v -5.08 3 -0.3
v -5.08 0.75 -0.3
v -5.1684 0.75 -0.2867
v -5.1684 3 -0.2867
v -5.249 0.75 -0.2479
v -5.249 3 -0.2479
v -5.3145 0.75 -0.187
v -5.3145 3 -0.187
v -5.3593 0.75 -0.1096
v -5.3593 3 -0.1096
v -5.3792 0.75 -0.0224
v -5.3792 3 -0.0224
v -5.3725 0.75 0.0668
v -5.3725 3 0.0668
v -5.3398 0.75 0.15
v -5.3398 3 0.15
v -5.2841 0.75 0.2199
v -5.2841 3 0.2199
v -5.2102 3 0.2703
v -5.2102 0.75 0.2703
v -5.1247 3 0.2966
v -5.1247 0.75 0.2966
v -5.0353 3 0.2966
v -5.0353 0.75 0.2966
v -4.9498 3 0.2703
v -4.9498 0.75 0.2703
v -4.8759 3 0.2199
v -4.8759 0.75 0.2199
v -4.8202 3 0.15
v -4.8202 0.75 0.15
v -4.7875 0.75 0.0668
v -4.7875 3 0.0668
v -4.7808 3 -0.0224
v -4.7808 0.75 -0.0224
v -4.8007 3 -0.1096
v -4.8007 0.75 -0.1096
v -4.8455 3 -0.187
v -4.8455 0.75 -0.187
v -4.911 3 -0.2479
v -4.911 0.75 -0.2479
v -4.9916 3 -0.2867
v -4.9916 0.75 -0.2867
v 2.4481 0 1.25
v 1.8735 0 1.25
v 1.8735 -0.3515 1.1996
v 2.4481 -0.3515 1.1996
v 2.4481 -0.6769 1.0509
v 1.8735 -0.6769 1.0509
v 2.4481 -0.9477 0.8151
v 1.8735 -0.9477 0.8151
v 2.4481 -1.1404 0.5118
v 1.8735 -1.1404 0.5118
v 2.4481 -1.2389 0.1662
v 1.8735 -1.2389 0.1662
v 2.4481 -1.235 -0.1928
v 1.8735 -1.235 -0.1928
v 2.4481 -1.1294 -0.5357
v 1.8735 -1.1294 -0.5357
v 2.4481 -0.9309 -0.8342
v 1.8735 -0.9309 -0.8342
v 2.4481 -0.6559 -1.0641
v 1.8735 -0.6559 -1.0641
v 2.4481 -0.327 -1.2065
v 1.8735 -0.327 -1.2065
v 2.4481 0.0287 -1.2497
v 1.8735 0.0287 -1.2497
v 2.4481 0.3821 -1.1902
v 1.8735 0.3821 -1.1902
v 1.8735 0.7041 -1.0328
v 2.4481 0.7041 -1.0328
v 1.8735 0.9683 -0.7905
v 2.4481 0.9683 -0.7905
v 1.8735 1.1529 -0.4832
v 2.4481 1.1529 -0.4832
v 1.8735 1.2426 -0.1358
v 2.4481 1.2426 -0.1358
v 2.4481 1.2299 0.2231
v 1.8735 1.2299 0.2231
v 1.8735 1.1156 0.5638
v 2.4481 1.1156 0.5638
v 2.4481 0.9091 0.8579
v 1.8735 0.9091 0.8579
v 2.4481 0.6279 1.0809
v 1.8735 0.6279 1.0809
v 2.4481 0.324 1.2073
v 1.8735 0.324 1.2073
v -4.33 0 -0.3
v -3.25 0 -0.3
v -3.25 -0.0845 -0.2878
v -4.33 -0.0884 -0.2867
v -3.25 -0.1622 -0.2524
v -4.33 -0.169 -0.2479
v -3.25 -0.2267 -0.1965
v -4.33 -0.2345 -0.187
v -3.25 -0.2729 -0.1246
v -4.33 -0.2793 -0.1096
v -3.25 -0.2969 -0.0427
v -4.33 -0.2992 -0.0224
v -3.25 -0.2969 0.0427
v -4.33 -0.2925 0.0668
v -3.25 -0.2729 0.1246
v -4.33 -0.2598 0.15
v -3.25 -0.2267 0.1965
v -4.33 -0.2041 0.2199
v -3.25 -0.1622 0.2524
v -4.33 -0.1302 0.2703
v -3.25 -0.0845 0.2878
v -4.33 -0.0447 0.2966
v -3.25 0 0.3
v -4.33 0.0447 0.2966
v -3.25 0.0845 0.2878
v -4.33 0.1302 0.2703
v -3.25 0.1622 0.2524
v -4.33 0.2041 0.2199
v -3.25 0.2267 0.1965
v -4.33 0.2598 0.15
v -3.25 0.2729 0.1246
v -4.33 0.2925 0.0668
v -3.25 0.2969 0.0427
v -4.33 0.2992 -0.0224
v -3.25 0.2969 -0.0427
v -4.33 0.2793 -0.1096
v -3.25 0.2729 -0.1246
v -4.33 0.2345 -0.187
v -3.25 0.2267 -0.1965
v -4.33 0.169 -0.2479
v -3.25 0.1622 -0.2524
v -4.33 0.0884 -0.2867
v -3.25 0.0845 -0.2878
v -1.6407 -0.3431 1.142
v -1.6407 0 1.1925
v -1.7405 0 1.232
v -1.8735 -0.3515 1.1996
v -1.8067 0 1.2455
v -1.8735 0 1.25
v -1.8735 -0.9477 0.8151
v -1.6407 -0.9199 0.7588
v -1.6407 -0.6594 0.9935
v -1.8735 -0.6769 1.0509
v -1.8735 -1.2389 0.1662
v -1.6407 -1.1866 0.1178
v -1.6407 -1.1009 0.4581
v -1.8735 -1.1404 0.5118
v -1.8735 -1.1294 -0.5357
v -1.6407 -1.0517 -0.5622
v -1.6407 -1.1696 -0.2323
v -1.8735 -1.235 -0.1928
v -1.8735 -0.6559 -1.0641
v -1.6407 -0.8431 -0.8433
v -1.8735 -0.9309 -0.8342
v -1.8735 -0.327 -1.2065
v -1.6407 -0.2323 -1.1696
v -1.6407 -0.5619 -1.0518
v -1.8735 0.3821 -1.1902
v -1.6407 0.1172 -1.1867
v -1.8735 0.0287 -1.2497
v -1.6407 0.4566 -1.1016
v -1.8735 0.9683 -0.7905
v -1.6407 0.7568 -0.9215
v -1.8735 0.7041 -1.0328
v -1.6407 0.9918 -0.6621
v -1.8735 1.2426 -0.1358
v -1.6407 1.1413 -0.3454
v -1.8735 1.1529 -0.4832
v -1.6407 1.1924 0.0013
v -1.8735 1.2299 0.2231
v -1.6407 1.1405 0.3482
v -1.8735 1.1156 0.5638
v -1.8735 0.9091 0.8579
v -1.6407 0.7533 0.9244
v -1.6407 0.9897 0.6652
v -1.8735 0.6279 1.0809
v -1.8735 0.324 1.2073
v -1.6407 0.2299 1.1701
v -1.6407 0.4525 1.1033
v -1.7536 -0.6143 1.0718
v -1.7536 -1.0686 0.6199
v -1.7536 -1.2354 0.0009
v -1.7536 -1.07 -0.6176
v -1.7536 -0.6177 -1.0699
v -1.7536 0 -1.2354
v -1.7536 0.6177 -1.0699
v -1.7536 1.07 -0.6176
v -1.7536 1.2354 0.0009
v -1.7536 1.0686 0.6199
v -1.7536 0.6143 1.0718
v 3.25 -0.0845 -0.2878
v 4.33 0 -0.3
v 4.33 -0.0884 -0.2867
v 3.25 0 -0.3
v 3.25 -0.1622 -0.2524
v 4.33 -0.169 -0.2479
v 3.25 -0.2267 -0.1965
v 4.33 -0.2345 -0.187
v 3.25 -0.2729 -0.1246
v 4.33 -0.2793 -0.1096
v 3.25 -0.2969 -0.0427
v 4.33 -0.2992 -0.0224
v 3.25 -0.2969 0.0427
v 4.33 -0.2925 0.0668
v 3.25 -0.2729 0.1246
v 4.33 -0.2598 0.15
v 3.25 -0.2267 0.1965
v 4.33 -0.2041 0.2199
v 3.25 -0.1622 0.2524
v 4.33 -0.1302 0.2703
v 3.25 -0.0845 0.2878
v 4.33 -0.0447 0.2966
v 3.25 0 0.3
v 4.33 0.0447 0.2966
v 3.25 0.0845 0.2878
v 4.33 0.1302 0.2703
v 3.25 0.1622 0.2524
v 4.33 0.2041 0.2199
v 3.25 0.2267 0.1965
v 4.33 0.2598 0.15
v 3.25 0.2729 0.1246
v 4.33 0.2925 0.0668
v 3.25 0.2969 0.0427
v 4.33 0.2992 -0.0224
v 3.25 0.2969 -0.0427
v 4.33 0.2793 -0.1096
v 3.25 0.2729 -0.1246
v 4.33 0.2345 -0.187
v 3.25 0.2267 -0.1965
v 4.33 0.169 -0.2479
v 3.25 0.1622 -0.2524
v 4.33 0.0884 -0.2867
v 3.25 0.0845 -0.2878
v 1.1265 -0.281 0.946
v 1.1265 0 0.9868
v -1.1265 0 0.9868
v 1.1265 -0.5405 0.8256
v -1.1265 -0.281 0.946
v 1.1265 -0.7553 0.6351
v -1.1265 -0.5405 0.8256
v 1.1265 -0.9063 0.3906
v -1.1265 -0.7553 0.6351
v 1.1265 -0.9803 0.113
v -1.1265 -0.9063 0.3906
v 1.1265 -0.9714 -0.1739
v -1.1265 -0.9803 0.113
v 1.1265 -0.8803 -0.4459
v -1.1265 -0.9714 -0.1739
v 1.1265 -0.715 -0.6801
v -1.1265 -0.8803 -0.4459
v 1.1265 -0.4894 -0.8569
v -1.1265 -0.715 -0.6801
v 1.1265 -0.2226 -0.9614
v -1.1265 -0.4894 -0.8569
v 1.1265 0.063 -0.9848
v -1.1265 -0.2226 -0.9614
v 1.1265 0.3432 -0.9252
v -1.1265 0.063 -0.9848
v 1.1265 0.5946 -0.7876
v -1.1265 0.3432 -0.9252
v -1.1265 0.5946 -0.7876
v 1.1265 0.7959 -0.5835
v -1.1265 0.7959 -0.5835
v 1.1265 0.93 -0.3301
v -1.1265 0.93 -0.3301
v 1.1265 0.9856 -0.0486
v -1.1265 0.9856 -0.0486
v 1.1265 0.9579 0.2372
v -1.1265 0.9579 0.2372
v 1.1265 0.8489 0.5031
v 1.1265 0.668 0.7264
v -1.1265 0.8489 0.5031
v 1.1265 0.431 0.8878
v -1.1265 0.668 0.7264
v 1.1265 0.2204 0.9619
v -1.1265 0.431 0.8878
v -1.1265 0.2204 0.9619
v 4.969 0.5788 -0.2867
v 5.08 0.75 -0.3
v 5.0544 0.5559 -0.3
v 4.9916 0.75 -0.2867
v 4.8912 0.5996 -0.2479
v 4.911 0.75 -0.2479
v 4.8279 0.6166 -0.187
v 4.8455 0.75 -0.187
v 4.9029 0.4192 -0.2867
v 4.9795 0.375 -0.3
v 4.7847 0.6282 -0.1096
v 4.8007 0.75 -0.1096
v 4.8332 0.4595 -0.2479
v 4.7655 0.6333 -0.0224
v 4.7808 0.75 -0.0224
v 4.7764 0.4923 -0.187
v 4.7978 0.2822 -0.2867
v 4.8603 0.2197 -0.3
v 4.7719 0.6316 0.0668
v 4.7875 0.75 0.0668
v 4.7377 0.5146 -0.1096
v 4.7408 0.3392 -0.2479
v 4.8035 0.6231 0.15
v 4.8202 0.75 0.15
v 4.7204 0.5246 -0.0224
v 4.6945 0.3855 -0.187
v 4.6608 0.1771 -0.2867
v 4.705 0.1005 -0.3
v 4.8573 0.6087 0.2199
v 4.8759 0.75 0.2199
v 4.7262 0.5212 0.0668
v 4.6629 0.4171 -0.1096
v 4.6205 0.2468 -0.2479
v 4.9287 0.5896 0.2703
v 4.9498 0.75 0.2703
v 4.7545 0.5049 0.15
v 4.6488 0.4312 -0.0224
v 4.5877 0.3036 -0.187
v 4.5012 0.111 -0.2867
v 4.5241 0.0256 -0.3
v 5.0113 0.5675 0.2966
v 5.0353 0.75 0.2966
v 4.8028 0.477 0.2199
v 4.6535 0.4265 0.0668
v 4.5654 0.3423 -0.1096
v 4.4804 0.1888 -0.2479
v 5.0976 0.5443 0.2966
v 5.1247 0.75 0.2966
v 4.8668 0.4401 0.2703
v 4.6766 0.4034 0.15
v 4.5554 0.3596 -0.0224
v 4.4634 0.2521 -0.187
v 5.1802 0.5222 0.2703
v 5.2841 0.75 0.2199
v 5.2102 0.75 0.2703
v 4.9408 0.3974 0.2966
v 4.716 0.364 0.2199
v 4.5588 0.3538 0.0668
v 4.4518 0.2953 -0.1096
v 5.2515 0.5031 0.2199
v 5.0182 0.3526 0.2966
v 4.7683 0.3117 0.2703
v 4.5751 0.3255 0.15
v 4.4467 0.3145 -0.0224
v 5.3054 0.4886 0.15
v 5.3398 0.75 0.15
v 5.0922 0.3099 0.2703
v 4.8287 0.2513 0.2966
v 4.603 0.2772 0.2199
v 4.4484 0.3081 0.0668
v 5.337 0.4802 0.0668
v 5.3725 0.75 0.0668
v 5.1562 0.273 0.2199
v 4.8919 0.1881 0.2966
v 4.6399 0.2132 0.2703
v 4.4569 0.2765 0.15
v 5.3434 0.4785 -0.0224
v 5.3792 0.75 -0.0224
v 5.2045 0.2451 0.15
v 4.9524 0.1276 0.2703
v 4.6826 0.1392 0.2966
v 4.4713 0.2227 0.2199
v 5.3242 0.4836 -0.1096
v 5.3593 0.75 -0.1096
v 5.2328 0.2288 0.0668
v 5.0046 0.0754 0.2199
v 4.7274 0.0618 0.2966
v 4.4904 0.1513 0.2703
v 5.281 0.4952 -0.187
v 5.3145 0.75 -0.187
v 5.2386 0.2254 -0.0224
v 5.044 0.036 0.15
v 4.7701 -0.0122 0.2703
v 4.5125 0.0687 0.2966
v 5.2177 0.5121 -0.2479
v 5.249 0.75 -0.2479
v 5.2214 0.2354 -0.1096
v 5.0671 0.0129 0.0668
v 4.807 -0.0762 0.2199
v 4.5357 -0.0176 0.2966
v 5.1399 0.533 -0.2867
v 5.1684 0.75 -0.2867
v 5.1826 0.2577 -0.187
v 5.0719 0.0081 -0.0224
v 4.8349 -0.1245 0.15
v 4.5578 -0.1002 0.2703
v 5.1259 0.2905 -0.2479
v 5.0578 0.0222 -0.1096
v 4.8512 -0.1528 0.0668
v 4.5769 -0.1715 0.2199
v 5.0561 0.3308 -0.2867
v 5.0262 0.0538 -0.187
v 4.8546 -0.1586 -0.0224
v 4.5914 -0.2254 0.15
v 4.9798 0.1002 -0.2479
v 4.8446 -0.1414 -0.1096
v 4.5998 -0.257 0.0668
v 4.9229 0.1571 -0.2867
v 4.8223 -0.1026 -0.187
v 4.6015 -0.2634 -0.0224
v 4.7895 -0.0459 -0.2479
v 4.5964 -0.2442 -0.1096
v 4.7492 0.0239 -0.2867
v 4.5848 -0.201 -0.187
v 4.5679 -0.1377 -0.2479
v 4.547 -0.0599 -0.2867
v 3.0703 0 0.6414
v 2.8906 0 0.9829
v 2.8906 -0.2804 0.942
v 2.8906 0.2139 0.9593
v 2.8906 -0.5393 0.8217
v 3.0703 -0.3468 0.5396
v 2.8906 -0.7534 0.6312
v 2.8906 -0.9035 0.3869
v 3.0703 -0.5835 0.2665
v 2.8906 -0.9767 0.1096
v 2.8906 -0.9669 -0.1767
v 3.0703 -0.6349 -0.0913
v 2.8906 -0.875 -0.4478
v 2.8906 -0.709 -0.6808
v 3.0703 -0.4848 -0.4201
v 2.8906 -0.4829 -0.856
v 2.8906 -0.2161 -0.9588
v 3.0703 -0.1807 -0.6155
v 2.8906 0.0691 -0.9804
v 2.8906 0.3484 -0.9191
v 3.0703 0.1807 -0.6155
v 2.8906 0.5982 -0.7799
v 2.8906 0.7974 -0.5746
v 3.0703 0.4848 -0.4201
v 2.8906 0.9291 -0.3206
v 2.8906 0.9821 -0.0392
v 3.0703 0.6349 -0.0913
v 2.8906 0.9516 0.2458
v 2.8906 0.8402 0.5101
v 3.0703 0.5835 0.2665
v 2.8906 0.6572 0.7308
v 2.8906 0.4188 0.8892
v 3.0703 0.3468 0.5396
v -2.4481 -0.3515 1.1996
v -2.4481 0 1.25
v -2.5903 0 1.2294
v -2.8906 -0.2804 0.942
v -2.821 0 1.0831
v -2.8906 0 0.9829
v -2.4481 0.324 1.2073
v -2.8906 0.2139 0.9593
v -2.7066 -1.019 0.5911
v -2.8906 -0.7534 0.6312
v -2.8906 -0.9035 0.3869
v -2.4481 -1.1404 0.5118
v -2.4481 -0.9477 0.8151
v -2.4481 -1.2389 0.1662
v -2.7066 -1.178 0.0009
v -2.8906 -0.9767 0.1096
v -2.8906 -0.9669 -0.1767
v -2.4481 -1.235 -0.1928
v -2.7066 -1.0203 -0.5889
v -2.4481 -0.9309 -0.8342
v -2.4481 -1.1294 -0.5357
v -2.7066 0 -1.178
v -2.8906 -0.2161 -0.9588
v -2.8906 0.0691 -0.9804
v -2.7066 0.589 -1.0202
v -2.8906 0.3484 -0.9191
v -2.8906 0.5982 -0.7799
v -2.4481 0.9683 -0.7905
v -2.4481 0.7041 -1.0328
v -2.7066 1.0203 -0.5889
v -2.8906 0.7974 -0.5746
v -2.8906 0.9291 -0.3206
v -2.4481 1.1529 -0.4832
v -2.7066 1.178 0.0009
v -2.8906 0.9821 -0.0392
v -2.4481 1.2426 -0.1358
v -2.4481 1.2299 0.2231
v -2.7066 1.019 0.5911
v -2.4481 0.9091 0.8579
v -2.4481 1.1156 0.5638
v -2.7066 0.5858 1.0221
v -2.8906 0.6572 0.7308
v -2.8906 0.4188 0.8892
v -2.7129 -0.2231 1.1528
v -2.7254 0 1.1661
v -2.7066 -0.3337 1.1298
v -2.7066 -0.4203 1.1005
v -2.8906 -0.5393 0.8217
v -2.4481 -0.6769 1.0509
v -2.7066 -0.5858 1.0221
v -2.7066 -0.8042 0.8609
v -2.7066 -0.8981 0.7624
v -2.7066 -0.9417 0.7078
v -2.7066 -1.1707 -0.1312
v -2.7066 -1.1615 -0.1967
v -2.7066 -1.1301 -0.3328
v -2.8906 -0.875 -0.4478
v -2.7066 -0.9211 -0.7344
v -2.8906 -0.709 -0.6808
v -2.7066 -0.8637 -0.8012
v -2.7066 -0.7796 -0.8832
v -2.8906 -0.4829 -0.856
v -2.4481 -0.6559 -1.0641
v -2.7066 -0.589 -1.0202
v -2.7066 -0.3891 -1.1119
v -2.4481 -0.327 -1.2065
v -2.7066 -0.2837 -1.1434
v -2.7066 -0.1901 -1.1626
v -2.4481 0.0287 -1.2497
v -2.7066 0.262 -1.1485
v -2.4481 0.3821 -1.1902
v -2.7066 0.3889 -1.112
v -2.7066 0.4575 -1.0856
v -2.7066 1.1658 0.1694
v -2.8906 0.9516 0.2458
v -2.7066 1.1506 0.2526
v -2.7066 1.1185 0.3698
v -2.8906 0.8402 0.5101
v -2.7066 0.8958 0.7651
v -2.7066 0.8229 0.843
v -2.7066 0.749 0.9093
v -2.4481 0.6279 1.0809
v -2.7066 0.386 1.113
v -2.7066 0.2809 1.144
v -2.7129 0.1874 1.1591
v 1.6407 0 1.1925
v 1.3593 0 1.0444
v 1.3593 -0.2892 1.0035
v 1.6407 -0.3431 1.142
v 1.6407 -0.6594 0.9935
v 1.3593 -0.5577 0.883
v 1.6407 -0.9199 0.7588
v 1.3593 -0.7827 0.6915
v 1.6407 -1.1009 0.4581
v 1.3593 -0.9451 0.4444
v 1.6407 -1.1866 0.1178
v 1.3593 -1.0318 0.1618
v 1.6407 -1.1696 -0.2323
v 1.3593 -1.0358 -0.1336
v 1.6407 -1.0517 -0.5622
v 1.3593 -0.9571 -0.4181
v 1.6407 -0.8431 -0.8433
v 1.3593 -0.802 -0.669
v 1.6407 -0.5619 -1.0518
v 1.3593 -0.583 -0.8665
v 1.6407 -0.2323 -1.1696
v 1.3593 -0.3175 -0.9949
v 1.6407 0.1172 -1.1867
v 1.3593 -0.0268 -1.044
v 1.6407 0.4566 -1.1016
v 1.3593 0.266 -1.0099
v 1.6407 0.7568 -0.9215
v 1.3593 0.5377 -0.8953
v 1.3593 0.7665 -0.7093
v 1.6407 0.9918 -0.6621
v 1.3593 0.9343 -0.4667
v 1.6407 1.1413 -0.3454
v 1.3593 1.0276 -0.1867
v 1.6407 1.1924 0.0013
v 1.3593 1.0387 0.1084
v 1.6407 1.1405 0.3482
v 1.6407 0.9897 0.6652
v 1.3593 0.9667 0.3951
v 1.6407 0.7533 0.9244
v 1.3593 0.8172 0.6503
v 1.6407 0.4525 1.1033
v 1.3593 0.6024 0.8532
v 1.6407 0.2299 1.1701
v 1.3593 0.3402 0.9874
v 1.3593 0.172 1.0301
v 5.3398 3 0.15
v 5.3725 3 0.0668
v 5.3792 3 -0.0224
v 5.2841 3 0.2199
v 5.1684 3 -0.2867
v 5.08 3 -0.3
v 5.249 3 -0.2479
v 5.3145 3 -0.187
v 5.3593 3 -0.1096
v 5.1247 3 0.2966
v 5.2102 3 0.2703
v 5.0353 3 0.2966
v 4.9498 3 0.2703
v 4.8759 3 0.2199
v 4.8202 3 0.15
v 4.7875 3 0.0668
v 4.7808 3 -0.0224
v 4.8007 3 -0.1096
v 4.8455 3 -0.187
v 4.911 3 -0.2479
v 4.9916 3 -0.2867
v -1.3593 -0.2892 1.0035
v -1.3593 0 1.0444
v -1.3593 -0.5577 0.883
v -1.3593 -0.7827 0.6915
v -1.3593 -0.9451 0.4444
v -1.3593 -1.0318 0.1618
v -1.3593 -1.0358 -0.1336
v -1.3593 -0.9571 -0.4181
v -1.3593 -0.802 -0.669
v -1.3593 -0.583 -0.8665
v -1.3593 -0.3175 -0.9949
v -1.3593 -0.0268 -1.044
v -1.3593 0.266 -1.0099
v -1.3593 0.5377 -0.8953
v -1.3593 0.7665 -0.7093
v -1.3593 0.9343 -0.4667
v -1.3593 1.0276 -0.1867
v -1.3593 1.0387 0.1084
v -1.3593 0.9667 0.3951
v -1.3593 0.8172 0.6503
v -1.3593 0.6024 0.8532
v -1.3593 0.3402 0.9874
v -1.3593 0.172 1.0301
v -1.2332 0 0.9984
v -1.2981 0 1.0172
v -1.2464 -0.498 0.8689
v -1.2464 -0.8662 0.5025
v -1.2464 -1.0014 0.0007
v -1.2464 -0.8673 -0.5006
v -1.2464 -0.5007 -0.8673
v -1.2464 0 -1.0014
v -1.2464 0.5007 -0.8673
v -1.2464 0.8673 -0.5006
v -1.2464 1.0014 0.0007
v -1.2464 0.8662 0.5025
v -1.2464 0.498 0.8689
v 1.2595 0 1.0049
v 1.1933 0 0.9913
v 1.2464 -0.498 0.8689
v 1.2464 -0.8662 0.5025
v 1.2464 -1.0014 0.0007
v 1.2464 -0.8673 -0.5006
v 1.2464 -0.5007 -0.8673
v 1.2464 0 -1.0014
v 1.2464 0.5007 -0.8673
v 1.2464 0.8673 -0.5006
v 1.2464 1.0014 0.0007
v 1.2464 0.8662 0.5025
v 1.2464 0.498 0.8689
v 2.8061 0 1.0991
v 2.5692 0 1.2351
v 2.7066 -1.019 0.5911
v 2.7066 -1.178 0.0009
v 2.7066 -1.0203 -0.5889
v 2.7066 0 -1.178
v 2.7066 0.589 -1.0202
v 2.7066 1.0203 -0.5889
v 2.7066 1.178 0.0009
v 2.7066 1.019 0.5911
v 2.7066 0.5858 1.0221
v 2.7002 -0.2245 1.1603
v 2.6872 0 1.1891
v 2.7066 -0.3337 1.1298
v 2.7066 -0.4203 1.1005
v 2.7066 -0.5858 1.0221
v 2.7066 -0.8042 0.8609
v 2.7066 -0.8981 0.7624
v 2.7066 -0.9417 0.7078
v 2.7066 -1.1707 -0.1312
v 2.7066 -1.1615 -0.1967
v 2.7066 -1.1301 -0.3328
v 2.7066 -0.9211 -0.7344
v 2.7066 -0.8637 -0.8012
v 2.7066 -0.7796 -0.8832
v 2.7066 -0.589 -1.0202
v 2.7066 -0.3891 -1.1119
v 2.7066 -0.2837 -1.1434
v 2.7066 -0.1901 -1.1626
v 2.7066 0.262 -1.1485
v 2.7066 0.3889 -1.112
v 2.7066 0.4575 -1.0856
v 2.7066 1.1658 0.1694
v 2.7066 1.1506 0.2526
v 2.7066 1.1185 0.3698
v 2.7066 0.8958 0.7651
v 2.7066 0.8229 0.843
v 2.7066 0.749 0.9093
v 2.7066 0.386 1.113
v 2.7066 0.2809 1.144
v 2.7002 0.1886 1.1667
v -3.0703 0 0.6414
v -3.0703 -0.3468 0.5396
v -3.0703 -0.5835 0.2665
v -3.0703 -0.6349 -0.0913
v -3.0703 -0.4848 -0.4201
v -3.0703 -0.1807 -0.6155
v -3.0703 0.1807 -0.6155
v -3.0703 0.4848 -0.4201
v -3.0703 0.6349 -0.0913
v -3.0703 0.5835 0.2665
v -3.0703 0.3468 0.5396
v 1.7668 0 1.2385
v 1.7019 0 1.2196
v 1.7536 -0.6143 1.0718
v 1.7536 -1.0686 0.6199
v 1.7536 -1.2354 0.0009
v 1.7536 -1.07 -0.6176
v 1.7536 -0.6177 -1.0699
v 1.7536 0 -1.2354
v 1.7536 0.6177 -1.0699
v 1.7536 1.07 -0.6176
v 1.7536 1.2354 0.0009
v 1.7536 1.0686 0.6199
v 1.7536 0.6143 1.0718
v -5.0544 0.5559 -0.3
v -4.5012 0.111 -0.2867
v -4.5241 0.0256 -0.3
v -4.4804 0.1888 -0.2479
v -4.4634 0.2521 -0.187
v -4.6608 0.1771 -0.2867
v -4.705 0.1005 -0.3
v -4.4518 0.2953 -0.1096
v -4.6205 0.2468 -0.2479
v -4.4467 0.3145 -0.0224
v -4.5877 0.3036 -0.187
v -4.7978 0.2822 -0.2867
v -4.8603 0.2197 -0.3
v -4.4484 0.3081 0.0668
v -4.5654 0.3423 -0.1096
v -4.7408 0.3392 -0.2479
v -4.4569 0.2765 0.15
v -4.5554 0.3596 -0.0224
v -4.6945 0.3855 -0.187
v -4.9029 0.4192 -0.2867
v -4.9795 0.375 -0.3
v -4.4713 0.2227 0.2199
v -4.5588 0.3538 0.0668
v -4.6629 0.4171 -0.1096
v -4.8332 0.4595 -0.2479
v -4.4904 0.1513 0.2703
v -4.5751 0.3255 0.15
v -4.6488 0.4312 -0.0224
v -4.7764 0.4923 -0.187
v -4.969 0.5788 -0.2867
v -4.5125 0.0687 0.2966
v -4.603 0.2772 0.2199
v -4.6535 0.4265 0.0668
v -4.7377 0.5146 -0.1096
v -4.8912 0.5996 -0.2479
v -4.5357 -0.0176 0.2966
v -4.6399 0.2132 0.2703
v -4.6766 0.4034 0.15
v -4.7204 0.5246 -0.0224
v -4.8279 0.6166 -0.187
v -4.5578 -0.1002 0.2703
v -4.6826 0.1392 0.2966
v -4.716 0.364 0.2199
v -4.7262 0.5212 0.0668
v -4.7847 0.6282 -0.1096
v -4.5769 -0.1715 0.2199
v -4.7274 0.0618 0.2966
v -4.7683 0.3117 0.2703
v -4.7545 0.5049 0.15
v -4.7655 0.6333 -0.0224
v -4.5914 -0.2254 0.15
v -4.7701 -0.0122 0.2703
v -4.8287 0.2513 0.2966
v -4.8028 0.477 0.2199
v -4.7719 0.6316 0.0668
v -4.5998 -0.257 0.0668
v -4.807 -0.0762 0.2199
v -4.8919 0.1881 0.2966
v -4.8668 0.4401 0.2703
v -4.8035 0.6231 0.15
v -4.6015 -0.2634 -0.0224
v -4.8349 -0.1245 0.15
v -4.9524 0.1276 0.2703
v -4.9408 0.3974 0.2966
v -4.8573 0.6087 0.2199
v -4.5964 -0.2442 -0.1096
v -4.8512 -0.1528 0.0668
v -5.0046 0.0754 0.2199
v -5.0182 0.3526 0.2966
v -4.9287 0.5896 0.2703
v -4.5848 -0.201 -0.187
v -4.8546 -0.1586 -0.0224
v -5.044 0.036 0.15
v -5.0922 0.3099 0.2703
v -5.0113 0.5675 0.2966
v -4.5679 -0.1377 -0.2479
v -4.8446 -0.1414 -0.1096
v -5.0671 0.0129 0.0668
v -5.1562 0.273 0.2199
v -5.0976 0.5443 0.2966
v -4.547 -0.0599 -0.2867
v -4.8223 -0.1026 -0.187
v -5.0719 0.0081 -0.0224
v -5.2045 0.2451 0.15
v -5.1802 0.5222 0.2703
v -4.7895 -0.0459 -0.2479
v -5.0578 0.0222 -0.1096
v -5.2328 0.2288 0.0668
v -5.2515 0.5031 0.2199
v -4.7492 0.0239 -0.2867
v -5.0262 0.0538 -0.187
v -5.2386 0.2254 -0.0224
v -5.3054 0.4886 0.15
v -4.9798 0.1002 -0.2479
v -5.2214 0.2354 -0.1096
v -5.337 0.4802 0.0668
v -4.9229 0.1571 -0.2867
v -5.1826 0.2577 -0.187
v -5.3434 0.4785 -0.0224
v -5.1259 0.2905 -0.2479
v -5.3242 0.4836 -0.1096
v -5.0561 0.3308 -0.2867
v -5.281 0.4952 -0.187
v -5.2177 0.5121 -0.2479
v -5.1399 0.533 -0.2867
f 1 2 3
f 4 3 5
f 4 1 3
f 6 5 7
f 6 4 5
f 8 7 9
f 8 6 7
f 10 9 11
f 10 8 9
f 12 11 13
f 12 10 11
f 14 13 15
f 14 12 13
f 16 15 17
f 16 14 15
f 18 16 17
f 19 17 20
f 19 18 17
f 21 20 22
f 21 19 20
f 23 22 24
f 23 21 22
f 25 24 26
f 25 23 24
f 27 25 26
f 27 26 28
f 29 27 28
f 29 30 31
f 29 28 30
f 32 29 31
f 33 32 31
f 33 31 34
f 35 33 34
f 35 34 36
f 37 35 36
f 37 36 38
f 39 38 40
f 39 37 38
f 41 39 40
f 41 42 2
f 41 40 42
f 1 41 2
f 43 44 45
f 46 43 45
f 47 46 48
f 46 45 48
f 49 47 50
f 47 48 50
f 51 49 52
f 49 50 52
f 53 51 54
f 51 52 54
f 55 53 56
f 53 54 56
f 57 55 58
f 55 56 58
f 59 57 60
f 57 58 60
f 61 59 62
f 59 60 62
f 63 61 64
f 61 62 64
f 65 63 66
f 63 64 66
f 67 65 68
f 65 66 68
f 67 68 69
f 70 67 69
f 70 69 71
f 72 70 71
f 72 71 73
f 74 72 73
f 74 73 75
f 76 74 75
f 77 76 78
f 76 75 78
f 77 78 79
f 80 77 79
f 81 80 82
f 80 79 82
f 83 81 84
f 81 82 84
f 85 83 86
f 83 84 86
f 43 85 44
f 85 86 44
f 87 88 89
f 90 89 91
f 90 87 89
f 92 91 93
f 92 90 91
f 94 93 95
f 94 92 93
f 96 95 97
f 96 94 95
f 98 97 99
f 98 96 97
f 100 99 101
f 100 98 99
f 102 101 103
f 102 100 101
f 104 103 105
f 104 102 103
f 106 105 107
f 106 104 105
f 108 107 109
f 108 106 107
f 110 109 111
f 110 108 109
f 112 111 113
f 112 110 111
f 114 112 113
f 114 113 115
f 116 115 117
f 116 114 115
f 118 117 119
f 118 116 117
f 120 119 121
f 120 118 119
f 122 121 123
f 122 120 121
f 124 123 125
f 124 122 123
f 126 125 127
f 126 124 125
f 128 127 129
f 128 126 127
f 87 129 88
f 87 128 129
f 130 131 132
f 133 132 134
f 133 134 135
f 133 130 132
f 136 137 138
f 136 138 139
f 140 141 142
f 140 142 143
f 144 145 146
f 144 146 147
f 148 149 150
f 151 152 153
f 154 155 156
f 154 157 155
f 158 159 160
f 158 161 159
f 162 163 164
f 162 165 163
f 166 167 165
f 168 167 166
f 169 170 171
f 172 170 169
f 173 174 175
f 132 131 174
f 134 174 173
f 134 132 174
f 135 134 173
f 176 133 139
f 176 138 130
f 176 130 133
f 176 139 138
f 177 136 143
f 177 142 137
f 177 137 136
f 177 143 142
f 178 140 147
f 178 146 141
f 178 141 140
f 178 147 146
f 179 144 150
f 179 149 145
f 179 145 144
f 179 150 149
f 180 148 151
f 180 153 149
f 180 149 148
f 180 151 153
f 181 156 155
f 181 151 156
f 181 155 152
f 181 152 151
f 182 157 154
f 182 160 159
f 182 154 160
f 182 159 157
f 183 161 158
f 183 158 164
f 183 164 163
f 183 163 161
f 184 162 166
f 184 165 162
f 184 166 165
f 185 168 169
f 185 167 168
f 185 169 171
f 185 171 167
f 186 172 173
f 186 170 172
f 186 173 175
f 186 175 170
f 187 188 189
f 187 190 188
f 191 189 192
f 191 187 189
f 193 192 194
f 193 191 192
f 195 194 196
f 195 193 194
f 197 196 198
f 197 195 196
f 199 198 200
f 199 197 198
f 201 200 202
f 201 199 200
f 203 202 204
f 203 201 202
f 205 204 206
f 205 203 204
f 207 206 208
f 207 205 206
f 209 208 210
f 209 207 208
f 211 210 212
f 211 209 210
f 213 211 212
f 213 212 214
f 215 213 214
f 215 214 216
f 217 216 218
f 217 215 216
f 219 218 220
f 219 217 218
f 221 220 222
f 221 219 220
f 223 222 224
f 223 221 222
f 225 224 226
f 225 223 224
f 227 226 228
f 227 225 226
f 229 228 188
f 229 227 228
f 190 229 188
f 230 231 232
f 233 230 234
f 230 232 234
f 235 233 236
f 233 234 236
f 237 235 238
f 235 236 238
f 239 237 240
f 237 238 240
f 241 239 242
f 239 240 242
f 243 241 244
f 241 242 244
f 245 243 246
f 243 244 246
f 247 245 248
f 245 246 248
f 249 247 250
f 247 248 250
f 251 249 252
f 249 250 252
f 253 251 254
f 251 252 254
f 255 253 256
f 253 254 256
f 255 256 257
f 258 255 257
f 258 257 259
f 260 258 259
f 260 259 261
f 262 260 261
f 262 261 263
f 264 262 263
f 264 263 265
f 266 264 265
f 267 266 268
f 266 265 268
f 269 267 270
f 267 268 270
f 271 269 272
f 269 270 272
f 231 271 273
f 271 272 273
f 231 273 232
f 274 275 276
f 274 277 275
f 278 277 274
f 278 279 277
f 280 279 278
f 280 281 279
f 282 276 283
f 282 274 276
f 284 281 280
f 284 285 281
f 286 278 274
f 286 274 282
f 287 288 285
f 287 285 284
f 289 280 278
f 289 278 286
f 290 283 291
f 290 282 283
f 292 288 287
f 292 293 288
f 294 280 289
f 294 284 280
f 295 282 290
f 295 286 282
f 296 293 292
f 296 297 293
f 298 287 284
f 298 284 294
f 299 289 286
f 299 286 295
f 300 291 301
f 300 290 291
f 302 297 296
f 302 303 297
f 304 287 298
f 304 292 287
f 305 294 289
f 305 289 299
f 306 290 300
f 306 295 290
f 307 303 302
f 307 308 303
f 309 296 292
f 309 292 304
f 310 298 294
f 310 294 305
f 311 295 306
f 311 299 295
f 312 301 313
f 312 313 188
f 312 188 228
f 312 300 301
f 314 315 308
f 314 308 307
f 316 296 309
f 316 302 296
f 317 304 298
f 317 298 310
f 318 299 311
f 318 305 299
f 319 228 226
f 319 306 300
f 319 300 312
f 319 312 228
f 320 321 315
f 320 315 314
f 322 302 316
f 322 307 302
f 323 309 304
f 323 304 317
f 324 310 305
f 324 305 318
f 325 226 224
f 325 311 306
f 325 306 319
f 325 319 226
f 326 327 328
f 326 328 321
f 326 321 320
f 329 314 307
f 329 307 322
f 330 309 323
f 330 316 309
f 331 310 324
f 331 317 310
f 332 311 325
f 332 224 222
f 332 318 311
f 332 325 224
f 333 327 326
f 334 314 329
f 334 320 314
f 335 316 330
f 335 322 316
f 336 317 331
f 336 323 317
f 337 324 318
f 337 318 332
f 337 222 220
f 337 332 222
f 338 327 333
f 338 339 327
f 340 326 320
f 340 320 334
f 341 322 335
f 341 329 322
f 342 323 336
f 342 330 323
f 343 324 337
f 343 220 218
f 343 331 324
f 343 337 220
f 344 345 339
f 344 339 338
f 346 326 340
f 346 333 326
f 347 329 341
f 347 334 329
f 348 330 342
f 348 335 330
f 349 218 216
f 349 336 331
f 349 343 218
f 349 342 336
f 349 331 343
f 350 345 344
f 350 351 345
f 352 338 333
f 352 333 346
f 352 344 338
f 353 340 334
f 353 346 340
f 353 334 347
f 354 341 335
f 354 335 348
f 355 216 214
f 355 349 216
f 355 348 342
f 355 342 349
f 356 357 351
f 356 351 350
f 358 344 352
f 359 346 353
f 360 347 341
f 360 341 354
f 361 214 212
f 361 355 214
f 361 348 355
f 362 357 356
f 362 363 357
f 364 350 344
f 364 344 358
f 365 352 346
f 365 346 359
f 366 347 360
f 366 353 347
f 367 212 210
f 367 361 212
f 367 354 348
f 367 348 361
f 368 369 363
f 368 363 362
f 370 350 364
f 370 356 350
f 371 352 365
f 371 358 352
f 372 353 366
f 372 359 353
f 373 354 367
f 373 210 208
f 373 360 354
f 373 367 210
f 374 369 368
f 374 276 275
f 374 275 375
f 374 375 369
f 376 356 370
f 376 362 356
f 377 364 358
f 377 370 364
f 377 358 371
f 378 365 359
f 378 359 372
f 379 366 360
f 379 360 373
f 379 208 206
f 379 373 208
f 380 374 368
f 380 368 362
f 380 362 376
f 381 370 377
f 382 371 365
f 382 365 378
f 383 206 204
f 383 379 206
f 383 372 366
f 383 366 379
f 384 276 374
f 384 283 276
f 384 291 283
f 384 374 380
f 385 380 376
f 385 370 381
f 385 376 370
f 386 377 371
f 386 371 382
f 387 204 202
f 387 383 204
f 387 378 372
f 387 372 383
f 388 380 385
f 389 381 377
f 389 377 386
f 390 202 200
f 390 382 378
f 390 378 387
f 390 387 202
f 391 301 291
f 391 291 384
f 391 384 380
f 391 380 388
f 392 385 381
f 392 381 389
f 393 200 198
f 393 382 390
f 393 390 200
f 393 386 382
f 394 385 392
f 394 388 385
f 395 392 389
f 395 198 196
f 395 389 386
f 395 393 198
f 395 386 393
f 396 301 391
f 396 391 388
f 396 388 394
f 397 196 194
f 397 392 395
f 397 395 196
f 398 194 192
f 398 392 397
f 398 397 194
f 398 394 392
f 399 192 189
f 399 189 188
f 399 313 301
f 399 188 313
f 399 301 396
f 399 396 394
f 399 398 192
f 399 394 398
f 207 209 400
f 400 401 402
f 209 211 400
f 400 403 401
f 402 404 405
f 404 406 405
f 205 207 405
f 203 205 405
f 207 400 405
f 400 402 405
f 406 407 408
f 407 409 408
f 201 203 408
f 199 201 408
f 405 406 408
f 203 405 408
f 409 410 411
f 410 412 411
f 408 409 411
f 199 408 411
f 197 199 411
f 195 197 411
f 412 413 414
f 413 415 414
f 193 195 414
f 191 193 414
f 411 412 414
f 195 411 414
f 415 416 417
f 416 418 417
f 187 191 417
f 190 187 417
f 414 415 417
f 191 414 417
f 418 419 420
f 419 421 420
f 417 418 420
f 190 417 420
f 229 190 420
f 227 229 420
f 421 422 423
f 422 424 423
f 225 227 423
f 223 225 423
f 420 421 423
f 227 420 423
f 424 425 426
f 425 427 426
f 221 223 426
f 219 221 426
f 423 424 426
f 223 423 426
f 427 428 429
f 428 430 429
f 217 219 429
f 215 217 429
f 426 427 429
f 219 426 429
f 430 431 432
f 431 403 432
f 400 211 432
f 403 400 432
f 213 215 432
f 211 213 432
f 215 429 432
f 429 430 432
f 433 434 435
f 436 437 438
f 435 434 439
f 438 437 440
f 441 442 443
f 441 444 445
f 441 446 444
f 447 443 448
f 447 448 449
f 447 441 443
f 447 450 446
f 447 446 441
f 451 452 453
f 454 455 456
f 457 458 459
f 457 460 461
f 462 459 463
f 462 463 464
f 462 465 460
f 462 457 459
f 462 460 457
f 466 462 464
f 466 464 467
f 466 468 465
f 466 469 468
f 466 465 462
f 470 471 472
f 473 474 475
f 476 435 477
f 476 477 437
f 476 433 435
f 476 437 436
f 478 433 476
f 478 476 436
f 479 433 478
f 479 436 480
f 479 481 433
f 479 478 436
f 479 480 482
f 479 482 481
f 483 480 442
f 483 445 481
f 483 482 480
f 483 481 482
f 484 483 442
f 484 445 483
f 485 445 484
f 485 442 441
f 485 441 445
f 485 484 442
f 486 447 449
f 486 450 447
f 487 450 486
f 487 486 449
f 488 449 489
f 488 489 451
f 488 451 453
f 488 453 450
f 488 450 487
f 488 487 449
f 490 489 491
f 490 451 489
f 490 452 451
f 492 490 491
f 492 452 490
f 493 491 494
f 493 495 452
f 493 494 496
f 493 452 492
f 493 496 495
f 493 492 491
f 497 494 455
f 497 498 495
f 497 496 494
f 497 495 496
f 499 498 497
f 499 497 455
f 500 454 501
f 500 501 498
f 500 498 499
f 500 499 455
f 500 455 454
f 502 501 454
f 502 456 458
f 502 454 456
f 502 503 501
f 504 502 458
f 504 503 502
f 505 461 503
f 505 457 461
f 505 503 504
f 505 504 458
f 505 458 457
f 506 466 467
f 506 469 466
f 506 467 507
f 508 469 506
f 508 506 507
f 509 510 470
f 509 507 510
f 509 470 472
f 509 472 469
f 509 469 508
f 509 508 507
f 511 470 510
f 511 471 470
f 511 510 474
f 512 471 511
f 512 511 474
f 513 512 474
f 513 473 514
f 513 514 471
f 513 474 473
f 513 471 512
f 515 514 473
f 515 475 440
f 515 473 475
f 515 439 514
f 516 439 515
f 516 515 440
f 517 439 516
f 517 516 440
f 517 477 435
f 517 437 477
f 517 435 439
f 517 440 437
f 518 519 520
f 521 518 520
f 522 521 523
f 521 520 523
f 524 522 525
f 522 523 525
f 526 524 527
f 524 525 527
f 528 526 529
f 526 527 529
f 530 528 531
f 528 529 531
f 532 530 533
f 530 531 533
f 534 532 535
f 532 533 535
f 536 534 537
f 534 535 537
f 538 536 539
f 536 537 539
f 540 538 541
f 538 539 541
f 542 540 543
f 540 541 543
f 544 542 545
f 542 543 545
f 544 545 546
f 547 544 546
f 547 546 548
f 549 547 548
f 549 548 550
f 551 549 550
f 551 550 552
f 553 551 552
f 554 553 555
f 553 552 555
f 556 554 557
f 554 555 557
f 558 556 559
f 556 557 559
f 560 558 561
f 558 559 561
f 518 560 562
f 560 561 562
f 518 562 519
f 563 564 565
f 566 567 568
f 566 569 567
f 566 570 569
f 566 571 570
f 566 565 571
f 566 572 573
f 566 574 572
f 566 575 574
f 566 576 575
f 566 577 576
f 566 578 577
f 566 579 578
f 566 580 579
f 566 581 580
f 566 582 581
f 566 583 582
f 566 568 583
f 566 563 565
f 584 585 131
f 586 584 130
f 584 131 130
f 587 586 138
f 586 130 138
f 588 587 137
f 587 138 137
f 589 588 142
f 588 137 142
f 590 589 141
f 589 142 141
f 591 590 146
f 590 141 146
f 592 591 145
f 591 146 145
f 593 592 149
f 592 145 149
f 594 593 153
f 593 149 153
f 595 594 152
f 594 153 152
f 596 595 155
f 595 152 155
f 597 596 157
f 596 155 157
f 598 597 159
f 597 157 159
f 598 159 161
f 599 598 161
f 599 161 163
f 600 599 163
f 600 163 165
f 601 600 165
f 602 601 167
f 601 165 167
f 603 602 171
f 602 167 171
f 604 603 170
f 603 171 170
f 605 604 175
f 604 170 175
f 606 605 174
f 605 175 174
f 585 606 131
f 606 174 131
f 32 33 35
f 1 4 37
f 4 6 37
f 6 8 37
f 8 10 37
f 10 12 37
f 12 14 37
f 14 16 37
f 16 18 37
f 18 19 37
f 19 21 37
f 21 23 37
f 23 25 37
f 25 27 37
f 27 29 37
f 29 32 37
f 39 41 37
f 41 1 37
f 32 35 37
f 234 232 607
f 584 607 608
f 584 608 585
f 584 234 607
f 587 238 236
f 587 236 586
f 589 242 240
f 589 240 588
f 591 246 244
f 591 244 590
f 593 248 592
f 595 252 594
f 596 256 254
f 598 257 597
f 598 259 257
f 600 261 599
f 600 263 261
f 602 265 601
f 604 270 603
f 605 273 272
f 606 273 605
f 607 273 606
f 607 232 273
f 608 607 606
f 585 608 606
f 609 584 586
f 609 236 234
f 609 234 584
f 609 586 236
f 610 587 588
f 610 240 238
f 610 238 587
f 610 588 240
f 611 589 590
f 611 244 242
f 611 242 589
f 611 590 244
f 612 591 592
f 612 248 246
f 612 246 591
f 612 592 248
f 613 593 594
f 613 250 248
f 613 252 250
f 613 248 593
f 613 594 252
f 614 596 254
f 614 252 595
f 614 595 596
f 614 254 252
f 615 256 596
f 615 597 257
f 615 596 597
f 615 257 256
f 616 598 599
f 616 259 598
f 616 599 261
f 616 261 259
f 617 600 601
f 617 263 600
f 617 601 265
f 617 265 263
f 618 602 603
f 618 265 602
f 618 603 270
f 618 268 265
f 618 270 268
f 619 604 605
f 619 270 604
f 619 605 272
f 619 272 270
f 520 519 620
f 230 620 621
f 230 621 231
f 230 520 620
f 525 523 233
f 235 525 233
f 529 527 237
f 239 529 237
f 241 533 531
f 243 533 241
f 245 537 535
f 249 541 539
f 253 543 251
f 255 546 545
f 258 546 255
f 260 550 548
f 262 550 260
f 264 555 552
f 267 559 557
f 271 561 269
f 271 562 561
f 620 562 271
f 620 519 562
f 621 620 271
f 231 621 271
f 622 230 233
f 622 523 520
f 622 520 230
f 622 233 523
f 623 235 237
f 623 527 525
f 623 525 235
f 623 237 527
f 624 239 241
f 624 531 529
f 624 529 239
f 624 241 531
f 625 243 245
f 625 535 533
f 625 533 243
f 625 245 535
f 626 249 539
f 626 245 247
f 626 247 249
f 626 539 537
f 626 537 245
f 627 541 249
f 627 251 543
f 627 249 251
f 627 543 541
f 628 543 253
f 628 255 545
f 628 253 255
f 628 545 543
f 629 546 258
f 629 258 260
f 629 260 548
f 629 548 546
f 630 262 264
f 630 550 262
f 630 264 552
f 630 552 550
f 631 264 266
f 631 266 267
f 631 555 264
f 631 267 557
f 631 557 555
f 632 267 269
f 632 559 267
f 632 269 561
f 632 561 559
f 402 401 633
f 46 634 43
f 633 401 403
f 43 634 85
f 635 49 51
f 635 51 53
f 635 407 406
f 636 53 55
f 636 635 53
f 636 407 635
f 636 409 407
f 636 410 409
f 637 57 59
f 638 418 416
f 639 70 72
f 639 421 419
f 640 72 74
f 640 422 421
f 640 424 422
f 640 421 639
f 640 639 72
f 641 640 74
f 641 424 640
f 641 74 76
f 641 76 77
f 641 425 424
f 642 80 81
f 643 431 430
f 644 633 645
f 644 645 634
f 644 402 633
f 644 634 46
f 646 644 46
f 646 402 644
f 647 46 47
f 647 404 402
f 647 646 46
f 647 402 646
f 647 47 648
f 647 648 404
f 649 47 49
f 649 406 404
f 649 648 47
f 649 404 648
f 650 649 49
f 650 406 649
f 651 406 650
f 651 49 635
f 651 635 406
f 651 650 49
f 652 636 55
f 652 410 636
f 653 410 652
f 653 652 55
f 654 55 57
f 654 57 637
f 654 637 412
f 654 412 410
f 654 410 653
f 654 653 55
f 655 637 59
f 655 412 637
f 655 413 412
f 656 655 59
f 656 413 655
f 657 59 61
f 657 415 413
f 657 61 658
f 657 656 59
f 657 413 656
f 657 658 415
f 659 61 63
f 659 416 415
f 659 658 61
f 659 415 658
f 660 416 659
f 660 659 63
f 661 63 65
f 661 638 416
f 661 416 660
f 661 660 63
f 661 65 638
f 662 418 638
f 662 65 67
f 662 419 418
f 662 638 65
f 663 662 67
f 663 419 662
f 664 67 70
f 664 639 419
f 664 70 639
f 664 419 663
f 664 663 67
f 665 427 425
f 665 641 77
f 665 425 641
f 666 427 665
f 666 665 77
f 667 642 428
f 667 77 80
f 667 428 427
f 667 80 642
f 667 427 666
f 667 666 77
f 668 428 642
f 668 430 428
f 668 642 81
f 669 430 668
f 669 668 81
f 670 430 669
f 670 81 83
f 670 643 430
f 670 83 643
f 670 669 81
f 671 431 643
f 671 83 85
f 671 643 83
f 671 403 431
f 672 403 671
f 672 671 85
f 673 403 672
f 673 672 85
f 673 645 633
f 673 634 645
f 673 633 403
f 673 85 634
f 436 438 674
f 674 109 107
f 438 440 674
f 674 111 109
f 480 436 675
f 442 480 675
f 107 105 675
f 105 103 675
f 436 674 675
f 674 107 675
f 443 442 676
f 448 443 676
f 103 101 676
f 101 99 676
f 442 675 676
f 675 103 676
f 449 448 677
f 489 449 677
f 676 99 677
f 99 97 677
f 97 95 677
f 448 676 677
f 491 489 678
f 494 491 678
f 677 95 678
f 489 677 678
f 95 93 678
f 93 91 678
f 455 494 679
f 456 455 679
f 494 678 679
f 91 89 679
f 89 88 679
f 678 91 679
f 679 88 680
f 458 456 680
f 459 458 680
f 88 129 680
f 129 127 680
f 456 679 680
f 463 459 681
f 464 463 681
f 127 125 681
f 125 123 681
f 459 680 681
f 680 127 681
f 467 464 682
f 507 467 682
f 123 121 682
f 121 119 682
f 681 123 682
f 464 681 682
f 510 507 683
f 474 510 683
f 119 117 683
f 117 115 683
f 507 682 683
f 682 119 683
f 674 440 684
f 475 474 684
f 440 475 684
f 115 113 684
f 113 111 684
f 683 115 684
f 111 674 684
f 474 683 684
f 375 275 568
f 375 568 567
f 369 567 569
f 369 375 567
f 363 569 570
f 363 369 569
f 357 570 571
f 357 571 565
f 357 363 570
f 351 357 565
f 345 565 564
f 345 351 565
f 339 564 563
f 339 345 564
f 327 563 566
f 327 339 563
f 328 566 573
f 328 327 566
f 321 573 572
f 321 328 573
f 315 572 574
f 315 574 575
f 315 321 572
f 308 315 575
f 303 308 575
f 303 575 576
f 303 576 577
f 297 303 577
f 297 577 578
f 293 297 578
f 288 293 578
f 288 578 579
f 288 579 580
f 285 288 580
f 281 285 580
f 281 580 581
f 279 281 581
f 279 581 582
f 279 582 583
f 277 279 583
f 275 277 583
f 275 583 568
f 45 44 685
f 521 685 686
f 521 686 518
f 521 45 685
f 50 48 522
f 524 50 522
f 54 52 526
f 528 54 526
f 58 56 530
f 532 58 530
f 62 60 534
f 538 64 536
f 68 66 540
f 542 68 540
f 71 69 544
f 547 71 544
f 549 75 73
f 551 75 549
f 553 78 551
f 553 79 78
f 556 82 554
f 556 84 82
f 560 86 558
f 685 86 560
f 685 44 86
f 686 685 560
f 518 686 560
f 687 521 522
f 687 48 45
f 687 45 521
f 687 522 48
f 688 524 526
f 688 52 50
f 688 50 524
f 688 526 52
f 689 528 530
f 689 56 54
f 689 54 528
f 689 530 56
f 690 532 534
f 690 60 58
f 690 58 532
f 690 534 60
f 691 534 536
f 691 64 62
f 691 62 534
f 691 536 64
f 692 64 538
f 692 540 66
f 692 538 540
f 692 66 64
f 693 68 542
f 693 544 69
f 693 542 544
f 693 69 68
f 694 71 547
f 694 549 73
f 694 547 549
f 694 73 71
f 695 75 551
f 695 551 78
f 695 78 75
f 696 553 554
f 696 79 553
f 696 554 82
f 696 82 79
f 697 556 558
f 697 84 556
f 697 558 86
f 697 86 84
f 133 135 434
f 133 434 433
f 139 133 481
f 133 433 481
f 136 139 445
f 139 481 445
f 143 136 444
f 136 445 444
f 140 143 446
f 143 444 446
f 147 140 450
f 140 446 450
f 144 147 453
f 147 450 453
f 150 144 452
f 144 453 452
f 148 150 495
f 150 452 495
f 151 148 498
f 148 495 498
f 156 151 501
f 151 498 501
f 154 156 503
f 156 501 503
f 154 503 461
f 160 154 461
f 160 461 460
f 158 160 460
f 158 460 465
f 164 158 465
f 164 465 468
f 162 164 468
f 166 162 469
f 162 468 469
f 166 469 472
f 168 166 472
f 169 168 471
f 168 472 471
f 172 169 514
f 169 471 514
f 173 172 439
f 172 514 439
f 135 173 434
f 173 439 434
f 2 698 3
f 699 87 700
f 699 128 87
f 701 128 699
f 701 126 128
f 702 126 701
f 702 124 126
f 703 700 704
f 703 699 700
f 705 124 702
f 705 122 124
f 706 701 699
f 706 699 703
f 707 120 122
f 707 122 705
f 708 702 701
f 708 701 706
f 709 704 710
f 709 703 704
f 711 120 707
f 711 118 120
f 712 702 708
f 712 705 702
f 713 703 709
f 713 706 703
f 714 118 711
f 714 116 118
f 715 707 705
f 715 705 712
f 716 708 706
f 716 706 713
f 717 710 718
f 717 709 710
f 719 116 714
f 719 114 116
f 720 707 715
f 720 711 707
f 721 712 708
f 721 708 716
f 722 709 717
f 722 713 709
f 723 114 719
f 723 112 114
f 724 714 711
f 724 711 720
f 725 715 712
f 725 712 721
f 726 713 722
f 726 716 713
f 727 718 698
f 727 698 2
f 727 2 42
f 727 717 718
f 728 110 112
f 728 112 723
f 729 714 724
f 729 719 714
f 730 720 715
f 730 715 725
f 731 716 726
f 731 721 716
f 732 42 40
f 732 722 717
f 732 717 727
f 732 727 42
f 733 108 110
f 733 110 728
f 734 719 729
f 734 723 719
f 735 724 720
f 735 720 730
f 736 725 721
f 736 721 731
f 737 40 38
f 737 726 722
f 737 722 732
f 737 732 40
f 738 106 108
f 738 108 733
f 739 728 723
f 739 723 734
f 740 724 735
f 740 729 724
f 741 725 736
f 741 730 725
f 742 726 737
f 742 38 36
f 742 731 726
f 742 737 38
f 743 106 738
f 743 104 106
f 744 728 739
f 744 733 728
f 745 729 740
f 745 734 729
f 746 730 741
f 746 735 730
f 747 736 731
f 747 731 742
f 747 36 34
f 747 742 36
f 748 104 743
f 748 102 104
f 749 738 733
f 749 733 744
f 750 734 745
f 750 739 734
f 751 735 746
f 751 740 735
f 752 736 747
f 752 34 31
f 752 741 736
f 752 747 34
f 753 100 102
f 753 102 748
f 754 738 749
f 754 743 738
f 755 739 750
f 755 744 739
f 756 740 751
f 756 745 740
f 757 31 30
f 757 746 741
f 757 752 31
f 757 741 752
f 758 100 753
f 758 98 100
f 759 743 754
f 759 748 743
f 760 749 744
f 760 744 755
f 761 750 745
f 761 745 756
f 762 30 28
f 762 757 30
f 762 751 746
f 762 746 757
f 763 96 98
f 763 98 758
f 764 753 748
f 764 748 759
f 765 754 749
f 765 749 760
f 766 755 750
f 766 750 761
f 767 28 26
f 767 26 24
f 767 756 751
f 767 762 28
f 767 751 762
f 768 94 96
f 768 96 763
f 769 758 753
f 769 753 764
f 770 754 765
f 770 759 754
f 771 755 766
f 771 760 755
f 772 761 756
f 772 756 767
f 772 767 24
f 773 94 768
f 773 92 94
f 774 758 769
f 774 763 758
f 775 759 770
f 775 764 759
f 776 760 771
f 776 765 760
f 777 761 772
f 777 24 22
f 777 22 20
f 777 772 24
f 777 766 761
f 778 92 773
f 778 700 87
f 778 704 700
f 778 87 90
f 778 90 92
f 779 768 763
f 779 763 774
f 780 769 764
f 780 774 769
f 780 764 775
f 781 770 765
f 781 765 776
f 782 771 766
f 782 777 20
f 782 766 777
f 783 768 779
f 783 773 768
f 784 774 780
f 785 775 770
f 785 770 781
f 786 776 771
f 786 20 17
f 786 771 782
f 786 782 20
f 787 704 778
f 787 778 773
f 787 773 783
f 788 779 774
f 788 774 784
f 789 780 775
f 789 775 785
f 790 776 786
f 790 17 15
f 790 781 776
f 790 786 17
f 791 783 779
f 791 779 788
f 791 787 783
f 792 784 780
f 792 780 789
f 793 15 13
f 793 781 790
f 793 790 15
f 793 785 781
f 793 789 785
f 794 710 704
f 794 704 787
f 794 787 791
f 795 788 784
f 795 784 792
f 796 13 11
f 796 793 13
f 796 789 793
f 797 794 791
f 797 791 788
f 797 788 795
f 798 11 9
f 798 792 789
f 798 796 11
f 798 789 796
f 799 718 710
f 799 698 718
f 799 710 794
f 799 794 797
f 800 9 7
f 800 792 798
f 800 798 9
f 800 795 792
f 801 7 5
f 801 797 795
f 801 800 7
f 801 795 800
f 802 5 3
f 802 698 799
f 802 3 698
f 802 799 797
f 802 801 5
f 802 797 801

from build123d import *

# Parameters (mm, degrees)
FILLET1_R = 0.5
SKETCH4_R = 0.3


with BuildPart() as part:
    # Sketch1 → Revolve1 (revolve)
    with BuildSketch(Plane.XY, mode=Mode.PRIVATE) as revolve1_sk:
        Polygon((0, 0), (3.25, 0), (3.25, 0.3), (2.75, 1.25), (1.75, 1.25), (1.25, 0.986842105), (-1.25, 0.986842105), (-1.75, 1.25), (-2.75, 1.25), (-3.25, 0.3), (-3.25, 0), align=None)
    revolve(revolve1_sk.sketch.rotate(Axis((0, 0, 0), (1, 0, 0)), 90), axis=Axis((0, 0, 0), (1, 0, 0)))

    # Fillet1
    fillet1_edges = [part.edges().sort_by_distance(p)[0] for p in [
        (1.75, 0, -1.25),
        (2.75, 0, -1.25),
        (-2.75, 0, -1.25),
        (-1.75, 0, -1.25),
        (-1.25, 0, -0.986842105),
        (1.25, 0, -0.986842105),
    ]]
    fillet(fillet1_edges, radius=FILLET1_R)

    # Sweep1: sweep along a path in Sketch6
    with BuildLine(Plane.XY) as sweep1_path:
        Line((5.08, 3), (5.08, 0.75))
        ThreePointArc((5.08, 0.75), (4.860330086, 0.219669914), (4.33, 0))
        Line((4.33, 0), (3.25, 0))
        Line((3.25, 0), (-4.33, 0))
        ThreePointArc((-4.33, 0), (-4.860330086, 0.219669914), (-5.08, 0.75))
        Line((-5.08, 0.75), (-5.08, 3))
    # Sketch4 → Sweep1 (sweep)
    with BuildSketch(Plane(origin=(3.25, 0, 0), x_dir=(0, 0, -1), z_dir=(1, 0, 0))):
        Circle(SKETCH4_R)
    sweep(path=sweep1_path.line)


solid = part.part
